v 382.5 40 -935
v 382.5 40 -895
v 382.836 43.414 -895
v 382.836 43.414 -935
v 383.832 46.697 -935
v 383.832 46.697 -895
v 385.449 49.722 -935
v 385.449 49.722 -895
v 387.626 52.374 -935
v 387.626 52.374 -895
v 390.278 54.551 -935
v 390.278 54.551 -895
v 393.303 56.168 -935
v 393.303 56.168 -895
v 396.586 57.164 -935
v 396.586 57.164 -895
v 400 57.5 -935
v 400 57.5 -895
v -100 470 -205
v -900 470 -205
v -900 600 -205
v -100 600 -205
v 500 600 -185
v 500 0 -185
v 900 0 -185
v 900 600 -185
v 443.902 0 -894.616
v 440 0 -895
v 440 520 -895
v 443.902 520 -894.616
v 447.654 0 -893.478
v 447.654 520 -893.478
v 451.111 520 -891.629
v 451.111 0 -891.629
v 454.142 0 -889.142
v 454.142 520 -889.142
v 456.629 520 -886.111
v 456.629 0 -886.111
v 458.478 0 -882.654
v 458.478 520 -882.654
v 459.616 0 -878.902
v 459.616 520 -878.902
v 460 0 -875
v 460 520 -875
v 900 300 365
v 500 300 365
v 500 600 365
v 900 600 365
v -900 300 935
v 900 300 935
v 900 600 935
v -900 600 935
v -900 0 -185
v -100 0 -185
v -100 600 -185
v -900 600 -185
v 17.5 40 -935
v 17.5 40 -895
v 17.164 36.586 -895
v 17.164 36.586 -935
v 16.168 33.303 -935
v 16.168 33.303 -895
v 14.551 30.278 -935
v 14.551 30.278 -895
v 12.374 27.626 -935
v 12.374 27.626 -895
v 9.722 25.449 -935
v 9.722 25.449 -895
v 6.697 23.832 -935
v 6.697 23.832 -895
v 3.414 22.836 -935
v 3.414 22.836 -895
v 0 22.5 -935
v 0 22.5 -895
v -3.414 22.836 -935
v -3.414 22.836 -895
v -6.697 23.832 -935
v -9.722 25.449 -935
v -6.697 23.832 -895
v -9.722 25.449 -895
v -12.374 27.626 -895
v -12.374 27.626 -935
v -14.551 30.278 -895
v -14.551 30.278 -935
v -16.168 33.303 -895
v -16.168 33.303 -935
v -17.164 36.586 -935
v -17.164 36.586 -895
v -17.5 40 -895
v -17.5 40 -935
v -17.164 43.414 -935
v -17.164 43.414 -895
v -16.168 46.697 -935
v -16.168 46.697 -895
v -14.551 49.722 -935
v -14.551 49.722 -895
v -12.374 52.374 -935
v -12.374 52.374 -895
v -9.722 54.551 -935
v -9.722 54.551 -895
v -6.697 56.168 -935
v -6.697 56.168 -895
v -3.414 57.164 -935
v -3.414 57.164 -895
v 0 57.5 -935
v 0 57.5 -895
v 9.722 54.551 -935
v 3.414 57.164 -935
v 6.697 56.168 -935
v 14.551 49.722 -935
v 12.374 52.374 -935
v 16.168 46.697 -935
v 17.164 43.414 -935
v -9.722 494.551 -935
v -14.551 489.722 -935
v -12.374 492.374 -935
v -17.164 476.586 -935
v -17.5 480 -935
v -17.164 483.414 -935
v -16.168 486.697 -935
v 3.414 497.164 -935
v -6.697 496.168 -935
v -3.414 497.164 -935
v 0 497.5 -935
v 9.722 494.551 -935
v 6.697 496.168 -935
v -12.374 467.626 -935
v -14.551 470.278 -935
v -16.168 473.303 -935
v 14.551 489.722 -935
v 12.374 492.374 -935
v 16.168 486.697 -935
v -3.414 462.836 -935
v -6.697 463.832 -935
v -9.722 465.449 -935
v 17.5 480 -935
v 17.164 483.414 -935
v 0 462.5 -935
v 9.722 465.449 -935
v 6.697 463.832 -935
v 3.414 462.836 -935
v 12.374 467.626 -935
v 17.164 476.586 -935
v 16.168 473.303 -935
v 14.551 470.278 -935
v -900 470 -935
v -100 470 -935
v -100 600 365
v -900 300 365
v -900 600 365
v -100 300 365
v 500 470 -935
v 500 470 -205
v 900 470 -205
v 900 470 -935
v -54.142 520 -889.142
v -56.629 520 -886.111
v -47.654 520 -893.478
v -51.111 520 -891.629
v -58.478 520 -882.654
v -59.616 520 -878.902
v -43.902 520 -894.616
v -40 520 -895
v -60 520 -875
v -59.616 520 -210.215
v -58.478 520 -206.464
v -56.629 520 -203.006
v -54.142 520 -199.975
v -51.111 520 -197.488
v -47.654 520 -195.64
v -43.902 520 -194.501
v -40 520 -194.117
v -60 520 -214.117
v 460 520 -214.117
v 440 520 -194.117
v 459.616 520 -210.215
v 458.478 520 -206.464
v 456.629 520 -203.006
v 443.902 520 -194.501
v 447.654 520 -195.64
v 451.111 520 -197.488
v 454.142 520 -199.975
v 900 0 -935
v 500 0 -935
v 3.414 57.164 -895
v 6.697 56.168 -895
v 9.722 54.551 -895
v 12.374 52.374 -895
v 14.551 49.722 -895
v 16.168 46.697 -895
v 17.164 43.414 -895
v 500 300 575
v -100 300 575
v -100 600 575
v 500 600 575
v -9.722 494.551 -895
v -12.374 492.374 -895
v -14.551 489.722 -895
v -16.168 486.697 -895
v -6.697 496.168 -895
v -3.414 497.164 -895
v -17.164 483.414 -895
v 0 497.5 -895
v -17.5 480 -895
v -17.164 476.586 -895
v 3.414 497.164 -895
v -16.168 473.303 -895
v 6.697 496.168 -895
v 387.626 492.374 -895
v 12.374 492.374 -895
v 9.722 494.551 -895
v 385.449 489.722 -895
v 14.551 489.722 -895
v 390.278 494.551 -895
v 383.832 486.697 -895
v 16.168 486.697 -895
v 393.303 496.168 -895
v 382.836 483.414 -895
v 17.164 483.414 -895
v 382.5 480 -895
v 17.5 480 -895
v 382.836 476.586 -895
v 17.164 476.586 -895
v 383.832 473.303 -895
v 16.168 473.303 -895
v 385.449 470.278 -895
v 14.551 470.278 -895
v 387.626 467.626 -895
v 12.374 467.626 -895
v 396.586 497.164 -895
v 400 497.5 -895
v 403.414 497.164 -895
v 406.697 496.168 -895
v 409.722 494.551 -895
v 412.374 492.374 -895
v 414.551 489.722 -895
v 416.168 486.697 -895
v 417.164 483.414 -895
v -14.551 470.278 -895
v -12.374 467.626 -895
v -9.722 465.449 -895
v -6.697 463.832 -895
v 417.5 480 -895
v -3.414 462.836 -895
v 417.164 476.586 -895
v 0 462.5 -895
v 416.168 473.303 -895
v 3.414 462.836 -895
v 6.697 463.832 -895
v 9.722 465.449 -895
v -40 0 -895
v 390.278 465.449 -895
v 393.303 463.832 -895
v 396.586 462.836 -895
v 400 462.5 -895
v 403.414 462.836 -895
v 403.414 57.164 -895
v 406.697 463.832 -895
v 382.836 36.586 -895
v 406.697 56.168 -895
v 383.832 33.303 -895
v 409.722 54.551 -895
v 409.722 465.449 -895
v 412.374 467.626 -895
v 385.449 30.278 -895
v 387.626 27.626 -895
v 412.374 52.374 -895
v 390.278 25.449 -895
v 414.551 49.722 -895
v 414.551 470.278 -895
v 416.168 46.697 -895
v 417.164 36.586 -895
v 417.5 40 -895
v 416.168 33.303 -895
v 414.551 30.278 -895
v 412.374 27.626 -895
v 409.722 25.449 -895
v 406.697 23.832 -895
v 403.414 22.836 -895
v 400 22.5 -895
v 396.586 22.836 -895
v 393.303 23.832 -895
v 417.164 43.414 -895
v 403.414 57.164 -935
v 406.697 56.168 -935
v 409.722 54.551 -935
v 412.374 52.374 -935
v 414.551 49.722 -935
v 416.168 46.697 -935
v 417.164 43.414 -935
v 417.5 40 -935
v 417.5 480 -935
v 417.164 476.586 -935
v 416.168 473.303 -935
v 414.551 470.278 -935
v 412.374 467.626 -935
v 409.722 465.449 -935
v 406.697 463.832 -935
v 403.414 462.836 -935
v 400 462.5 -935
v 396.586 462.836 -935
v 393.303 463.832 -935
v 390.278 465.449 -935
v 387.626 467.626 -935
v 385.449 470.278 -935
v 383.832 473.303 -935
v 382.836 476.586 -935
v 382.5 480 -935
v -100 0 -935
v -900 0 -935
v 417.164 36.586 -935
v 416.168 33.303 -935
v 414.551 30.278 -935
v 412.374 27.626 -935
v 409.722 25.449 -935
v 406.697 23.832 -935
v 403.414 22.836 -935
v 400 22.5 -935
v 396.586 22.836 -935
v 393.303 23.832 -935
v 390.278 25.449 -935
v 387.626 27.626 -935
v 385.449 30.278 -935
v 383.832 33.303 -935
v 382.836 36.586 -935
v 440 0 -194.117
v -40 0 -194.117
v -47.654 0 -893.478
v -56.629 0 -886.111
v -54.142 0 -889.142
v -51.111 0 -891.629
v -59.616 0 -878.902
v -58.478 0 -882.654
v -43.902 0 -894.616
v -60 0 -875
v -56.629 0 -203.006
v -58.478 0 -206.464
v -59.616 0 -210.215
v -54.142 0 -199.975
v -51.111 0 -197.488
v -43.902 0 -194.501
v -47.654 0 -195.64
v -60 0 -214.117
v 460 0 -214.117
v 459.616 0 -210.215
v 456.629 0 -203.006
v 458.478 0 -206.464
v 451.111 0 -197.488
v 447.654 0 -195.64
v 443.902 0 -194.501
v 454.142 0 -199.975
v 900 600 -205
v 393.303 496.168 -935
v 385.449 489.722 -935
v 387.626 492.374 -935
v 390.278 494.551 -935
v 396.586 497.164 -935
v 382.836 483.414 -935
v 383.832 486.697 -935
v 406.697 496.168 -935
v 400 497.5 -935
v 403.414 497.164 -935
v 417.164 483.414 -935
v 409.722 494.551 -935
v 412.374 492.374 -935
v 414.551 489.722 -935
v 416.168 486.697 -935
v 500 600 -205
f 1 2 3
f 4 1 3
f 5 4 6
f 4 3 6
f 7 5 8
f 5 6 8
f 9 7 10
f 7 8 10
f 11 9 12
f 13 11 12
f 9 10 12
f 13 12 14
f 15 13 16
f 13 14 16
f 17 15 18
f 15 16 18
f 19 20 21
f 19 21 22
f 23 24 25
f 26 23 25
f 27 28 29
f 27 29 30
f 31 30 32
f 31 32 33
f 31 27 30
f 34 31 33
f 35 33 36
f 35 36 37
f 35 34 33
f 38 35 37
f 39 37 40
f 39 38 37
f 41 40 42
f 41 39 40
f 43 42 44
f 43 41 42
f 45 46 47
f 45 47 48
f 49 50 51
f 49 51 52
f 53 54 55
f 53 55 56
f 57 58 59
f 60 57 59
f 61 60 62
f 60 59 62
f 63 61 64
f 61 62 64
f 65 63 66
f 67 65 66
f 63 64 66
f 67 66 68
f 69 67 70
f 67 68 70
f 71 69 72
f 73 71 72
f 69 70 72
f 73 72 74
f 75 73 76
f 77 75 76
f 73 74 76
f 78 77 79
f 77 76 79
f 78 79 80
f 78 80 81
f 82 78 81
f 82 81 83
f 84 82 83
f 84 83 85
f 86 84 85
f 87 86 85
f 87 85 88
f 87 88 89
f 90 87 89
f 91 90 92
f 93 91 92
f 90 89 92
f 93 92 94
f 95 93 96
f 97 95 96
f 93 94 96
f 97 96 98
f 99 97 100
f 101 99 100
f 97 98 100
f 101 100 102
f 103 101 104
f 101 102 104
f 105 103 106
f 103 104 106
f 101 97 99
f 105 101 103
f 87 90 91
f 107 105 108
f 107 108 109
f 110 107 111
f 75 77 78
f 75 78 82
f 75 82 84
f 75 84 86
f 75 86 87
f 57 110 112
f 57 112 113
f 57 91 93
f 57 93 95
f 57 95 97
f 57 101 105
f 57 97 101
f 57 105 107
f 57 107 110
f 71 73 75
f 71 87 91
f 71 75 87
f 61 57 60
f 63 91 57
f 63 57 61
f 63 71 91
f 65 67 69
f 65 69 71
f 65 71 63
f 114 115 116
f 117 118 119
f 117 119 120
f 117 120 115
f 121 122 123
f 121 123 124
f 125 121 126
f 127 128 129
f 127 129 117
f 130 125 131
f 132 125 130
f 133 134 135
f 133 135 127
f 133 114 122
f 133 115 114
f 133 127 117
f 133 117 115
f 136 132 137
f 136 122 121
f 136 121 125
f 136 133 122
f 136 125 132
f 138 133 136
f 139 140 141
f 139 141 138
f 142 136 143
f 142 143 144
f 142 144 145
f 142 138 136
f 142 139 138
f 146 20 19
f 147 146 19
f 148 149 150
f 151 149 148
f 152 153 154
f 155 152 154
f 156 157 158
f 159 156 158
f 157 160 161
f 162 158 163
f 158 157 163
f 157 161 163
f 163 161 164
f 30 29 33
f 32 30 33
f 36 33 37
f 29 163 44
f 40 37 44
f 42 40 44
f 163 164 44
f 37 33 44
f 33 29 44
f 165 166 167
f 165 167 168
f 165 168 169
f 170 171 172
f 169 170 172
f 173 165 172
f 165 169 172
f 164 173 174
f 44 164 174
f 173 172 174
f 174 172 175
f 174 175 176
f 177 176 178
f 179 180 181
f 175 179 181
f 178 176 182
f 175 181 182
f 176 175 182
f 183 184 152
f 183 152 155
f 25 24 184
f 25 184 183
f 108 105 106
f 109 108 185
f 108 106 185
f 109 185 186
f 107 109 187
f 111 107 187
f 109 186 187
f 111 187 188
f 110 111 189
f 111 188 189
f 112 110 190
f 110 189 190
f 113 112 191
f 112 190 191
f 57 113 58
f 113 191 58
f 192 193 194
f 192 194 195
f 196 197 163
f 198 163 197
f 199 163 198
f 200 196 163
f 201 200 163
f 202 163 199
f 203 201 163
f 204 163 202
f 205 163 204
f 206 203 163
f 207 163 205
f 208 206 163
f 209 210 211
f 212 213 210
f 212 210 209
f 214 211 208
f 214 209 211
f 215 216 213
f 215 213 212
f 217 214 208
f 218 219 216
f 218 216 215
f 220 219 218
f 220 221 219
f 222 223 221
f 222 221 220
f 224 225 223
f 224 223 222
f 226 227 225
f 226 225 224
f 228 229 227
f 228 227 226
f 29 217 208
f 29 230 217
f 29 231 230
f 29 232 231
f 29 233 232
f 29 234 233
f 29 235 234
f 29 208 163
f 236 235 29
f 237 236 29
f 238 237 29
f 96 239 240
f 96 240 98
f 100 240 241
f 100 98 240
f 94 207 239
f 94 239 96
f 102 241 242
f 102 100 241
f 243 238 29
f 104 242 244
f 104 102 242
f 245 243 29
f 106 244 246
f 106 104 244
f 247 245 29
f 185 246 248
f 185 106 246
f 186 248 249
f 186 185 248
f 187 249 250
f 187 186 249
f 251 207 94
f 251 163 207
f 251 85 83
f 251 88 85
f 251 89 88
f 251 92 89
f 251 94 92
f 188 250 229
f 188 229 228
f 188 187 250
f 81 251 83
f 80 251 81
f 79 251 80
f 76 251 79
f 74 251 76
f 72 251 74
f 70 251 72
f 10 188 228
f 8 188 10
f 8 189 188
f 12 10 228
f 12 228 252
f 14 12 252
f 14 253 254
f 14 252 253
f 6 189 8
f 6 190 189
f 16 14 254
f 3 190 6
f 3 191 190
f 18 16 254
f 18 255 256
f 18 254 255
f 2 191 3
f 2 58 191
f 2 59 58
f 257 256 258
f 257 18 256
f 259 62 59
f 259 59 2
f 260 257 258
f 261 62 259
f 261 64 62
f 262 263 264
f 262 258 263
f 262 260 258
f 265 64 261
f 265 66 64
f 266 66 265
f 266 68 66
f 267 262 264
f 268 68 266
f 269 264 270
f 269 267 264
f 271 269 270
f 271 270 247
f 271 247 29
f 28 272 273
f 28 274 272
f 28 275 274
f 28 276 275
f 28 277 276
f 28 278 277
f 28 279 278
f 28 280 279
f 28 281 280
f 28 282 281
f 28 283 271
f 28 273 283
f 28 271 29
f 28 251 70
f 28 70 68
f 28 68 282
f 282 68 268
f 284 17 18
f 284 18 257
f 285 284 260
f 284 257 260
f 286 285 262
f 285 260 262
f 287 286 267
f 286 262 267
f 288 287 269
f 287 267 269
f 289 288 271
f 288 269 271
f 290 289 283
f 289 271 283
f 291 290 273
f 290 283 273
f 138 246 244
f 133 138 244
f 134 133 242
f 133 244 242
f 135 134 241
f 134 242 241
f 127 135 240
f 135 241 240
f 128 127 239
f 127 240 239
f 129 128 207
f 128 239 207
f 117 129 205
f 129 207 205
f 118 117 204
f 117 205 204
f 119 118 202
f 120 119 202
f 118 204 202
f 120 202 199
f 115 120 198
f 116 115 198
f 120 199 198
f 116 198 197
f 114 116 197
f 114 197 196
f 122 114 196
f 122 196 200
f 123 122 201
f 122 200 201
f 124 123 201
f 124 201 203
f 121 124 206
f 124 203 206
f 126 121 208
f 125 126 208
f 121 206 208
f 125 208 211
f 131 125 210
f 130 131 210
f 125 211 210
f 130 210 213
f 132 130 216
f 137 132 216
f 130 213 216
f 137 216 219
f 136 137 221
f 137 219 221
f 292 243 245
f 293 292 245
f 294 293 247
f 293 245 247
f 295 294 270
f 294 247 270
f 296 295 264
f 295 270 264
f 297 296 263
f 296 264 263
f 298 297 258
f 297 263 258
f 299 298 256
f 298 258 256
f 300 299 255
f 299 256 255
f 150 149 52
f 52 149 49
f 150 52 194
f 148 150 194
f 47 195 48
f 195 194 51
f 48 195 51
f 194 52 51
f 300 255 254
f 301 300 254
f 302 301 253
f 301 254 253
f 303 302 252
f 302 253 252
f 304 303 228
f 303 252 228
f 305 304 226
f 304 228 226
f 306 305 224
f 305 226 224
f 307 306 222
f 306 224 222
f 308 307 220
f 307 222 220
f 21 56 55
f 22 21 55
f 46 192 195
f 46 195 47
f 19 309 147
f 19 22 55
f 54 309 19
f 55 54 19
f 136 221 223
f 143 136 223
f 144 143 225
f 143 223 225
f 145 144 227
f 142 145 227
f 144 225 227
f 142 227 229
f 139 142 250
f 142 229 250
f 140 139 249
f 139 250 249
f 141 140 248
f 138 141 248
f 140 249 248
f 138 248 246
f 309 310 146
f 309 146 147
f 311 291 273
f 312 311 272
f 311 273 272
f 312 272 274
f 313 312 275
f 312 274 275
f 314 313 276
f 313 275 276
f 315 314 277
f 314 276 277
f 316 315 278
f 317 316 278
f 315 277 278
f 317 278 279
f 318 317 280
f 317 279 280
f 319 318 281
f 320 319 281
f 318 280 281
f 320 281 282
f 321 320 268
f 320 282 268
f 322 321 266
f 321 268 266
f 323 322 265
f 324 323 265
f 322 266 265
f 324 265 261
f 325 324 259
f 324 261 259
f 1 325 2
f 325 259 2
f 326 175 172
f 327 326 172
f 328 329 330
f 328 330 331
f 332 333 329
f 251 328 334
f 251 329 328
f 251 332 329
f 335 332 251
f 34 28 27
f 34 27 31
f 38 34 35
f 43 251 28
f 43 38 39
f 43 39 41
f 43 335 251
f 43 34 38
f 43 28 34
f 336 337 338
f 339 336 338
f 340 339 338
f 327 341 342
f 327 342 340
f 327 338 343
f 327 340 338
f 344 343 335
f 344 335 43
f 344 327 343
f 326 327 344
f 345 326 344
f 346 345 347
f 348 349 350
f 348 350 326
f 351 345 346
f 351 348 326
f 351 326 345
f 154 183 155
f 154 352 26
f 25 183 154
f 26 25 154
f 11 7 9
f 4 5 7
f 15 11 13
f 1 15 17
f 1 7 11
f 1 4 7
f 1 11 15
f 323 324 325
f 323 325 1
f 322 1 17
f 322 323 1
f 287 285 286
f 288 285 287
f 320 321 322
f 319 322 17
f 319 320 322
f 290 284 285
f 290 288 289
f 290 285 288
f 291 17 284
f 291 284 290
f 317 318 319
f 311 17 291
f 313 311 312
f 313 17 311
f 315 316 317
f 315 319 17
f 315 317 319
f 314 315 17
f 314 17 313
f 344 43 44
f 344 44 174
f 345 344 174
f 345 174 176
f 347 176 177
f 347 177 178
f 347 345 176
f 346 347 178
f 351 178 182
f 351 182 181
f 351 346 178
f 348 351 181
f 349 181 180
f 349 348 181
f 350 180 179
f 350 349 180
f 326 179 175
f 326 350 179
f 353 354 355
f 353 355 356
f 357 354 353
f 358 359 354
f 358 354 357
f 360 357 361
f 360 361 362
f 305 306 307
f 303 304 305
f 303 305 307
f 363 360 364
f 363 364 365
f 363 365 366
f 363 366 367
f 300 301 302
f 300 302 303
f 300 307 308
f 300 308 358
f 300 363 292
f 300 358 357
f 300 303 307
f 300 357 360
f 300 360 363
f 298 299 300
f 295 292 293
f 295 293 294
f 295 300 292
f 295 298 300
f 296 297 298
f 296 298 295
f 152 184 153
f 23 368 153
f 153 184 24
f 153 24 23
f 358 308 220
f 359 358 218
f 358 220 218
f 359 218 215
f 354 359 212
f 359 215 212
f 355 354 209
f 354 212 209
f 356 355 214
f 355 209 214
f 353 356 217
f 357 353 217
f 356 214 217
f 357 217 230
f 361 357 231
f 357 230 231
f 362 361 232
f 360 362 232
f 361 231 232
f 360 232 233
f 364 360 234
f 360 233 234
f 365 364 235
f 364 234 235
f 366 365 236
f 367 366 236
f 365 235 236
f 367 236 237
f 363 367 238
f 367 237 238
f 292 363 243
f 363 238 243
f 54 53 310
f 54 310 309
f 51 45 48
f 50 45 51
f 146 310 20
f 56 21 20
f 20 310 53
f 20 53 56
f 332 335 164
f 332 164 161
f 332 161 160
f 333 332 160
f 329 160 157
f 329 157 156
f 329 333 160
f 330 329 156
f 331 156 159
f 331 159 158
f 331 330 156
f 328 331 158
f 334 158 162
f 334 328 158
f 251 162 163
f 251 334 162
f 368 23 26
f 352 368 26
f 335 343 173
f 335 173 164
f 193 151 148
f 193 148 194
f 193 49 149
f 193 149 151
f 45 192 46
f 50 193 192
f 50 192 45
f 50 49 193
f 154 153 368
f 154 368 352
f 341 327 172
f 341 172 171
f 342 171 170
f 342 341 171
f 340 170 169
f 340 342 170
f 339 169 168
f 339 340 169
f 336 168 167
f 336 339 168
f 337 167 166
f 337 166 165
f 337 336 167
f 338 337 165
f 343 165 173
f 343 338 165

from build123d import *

# Parameters (mm, degrees)
F0_W     = 520
F0_H     = 121.0741209984
F0_H_2   = 441.2462595788
F1_DEPTH = 520
F2_DEPTH = 600
F0_W_2   = 400
F0_H_3   = 20
F0_H_4   = 730
F3_DEPTH = 470
F4_START = -300
F0_H_5   = 570
F0_W_3   = 600
F0_H_6   = 360
F4_DEPTH = 300
F6_DEPTH = 40


with BuildPart() as f1:
    # F0 (on Front) → F1 (new body)
    with BuildSketch(Plane.XZ):
        with Locations((200, -274.6542605075)):
            Rectangle(F0_W, F0_H)
        with Locations((200, -555.8144507961)):
            Rectangle(F0_W, F0_H_2)
        with BuildLine():
            Line((440, -194.1172000083), (-40, -194.1172000083))
            ThreePointArc((-40, -194.1172000083), (-54.1421356237, -199.9750643845), (-60, -214.1172000083))
            Line((-60, -214.1172000083), (460, -214.1172000083))
            ThreePointArc((460, -214.1172000083), (454.1421356237, -199.9750643845), (440, -194.1172000083))
        make_face()
        with BuildLine():
            Line((460, -776.4375805855), (-60, -776.4375805855))
            Line((-60, -776.4375805855), (-60, -875))
            ThreePointArc((-60, -875), (-54.1421356237, -889.1421356237), (-40, -895))
            Line((-40, -895), (440, -895))
            ThreePointArc((440, -895), (454.1421356237, -889.1421356237), (460, -875))
            Line((460, -875), (460, -776.4375805855))
        make_face()
    extrude(amount=-F1_DEPTH)

    # F5 (on face) → F6 (join)
    with BuildSketch(Plane(origin=(0, 0, -895), x_dir=(1, 0, 0), z_dir=(0, 0, -1))):
        with BuildLine():
            ThreePointArc((0, -57.5), (12.3743686708, -52.3743686708), (17.5, -40))
            ThreePointArc((17.5, -40), (-12.3743686708, -27.6256313292), (0, -57.5))
        make_face()
        with BuildLine():
            ThreePointArc((417.5, -40), (400, -22.5), (382.5, -40))
            ThreePointArc((382.5, -40), (387.6256313292, -52.3743686708), (400, -57.5))
            ThreePointArc((400, -57.5), (412.3743686708, -52.3743686708), (417.5, -40))
        make_face()
        with BuildLine():
            ThreePointArc((17.5, -480), (12.3743686708, -467.6256313292), (0, -462.5))
            ThreePointArc((0, -462.5), (-12.3743686708, -492.3743686708), (17.5, -480))
        make_face()
        with BuildLine():
            ThreePointArc((417.5, -480), (412.3743686708, -467.6256313292), (400, -462.5))
            ThreePointArc((400, -462.5), (387.6256313292, -467.6256313292), (382.5, -480))
            ThreePointArc((382.5, -480), (400, -497.5), (417.5, -480))
        make_face()
    extrude(amount=F6_DEPTH)


with BuildPart() as f2:
    # F0 (on Front) → F2 (new body)
    with BuildSketch(Plane.XZ):
        Polygon((-900, -185), (-900, -205), (-500, -205), (-100, -205), (-100, -185), align=None)
    extrude(amount=-F2_DEPTH)

    # F0 (on Front) → F3 (join)
    with BuildSketch(Plane.XZ):
        with Locations((-700, -570)):
            Rectangle(F0_W_2, F0_H_4)
        with Locations((-300, -570)):
            Rectangle(F0_W_2, F0_H_4)
    extrude(amount=-F3_DEPTH)


with BuildPart() as f2b:
    # F0 (on Front) → F2, piece 2 (new body)
    with BuildSketch(Plane.XZ):
        with Locations((700, -195)):
            Rectangle(F0_W_2, F0_H_3)
    extrude(amount=-F2_DEPTH)

    # F0 (on Front) → F3, piece 2 (join)
    with BuildSketch(Plane.XZ):
        with Locations((700, -570)):
            Rectangle(F0_W_2, F0_H_4)
    extrude(amount=-F3_DEPTH)


with BuildPart() as f4:
    # F0 (on Front) → F4 (new body)
    with BuildSketch(Plane.XZ.offset(F4_START)):
        with Locations((-700, 650)):
            Rectangle(F0_W_2, F0_H_5)
        Polygon((-100, 935), (-500, 935), (-500, 365), (-100, 365), (-100, 575), align=None)
        with Locations((200, 755)):
            Rectangle(F0_W_3, F0_H_6)
        Polygon((900, 935), (500, 935), (500, 575), (500, 365), (900, 365), align=None)
    extrude(amount=-F4_DEPTH)


solid = Compound([f1.part, f2.part, f2b.part, f4.part])
